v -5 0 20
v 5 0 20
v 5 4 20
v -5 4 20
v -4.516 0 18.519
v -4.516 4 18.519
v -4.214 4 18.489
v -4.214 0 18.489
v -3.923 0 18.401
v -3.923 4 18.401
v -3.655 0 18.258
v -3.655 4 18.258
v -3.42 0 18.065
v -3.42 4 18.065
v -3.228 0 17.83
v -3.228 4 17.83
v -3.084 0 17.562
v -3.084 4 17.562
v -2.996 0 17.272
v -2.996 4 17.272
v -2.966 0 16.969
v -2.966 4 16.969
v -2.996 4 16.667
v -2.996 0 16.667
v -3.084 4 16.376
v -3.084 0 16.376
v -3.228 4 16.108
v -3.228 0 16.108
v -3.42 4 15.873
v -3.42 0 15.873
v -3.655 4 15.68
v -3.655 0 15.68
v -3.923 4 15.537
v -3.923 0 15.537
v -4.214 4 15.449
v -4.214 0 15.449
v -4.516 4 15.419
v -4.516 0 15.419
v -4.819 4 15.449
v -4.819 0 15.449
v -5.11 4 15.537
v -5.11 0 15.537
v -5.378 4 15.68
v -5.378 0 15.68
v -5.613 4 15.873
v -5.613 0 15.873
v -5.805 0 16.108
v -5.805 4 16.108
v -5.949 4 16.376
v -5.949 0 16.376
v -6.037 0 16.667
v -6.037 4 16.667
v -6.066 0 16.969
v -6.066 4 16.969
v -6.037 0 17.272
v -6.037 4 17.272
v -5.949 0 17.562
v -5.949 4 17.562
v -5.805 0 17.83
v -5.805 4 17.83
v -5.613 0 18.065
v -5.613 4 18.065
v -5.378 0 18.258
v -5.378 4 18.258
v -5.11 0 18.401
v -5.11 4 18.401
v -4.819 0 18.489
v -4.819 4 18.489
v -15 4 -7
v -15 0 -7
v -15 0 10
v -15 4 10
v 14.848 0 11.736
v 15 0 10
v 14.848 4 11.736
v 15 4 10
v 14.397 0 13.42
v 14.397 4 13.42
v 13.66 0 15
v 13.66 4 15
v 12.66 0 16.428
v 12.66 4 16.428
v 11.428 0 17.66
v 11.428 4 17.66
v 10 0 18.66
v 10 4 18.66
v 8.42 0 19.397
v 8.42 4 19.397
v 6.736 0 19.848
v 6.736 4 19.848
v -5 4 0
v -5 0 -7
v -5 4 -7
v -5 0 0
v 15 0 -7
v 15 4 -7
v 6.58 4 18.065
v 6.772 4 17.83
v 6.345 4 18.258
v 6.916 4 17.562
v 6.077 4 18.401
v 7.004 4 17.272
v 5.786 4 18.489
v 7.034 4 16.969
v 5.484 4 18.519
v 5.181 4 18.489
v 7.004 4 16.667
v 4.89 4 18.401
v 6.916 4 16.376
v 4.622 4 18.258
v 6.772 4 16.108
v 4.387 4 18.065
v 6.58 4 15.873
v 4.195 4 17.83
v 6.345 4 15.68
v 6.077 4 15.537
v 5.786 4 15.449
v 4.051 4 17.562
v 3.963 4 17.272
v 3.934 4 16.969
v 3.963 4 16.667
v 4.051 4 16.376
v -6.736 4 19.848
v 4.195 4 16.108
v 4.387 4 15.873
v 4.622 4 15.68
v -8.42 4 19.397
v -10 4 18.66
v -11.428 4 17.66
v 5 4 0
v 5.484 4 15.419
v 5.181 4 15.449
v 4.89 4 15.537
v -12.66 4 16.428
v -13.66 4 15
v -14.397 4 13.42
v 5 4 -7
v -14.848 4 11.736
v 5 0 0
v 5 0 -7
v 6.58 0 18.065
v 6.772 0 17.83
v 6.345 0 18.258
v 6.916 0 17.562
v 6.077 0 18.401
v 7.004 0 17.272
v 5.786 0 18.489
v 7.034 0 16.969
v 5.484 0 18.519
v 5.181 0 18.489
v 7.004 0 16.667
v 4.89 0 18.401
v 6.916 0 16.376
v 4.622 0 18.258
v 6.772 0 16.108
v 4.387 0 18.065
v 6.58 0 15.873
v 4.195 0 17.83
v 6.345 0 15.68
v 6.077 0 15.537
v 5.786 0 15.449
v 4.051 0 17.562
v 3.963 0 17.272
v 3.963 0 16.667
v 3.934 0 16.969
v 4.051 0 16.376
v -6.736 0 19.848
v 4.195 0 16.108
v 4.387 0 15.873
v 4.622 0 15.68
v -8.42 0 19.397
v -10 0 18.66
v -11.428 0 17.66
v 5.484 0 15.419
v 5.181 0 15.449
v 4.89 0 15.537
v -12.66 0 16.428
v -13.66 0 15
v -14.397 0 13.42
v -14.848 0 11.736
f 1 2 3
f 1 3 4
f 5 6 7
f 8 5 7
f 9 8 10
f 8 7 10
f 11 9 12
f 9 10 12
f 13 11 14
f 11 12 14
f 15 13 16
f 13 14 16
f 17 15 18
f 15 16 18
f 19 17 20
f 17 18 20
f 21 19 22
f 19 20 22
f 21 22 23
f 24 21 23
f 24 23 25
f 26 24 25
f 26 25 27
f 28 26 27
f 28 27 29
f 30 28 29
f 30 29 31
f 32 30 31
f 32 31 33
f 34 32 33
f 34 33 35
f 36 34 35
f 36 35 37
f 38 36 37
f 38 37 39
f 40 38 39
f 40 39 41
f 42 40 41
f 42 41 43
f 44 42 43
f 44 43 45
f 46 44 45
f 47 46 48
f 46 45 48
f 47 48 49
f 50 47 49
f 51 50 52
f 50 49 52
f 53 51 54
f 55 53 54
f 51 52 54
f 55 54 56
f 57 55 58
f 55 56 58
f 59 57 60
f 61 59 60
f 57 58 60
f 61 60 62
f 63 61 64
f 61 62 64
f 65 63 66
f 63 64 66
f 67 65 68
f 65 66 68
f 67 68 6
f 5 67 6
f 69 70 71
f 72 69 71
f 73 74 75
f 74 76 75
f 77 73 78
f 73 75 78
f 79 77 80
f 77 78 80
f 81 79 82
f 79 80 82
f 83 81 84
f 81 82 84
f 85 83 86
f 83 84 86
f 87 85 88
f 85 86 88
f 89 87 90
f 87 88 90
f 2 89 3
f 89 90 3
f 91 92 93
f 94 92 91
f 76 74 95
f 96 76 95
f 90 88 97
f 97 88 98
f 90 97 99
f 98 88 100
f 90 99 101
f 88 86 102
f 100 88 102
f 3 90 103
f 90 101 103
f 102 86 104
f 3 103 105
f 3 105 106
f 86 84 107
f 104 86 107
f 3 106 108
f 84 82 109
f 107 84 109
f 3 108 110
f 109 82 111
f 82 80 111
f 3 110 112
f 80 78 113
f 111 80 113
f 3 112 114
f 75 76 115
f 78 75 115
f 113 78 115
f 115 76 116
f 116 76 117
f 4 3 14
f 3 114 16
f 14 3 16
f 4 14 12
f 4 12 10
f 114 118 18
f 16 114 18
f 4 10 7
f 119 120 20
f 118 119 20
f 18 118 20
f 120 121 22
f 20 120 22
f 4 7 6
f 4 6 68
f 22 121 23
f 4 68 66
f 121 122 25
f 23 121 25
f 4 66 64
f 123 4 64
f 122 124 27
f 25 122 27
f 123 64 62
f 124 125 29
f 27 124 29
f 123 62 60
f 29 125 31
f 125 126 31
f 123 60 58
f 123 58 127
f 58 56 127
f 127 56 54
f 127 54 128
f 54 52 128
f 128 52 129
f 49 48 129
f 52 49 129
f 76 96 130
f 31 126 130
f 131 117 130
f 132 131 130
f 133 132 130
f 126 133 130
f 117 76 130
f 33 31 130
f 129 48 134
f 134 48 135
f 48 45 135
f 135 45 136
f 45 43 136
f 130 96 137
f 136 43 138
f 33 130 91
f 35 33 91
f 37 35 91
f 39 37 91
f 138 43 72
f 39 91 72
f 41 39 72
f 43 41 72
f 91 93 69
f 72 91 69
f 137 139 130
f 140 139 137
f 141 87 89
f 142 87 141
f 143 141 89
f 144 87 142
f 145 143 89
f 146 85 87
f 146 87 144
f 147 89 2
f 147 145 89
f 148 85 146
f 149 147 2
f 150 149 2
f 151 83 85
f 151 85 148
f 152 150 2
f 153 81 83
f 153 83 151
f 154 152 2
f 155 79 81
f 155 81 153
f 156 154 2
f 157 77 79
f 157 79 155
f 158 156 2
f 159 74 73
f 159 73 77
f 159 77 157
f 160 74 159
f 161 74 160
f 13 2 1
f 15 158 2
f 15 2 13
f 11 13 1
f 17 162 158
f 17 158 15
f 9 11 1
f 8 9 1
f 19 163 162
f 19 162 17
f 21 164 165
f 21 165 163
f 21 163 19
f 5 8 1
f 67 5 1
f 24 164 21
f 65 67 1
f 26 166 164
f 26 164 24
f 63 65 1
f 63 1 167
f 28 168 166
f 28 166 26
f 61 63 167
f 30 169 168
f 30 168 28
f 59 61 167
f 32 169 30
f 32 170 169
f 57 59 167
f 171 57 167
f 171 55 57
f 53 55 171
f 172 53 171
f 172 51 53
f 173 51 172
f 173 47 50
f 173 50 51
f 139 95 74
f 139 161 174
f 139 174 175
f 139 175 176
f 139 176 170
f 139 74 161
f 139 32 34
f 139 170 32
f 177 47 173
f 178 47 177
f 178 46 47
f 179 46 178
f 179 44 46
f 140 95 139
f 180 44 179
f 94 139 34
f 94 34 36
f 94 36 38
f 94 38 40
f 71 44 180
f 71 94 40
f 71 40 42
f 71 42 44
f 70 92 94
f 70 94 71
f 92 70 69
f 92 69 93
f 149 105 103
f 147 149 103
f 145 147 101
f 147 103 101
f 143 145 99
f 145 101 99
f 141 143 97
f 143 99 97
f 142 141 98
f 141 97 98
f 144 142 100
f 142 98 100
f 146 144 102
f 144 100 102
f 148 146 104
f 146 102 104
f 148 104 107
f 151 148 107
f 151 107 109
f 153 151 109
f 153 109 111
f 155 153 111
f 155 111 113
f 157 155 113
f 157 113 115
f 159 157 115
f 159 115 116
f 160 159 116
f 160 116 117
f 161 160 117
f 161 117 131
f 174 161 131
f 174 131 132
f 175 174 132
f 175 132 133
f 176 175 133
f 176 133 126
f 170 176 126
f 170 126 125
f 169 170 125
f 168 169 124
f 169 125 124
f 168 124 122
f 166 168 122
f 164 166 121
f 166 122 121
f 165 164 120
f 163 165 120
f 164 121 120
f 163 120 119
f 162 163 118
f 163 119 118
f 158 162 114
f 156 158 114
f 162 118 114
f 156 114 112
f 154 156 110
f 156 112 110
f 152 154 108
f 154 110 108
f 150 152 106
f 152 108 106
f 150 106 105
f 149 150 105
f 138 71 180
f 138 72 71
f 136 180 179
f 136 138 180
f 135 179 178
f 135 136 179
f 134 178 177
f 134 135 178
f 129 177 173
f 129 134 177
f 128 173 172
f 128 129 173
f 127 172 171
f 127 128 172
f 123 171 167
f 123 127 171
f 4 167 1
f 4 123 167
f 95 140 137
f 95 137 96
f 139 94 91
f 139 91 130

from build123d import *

# Parameters (mm, degrees)
BOSS_EXTRU_1_DEPTH      = 4
CONG_1_R                = 10
ESQUISSE3_R             = 1.55
ENL_V_MAT_EXTRU_1_DEPTH = 10


with BuildPart() as part:
    # Esquisse2 → Boss.-Extru.1 (new body)
    with BuildSketch(Plane(origin=(0, 0, 0), x_dir=(1, 0, 0), z_dir=(0, 1, 0))):
        Polygon((-15, 4.125844984), (-15, 7), (-5, 7), (-5, 0), (5, 0), (5, 7), (15, 7), (15, 0.999487428), (15, -20), (-15, -20), align=None)
    extrude(amount=BOSS_EXTRU_1_DEPTH)

    # Congé1
    cong_1_edges = [part.edges().sort_by_distance(p)[0] for p in [
        (15, 2, 20),
        (-15, 2, 20),
    ]]
    fillet(cong_1_edges, radius=CONG_1_R)

    # Esquisse3 → Enlèv. mat.-Extru.1 (cut)
    with BuildSketch(Plane(origin=(0, 4, 0), x_dir=(1, 0, 0), z_dir=(0, 1, 0))):
        with Locations(Location((5.483505043, -16.969125841, 0), (0, 0, 270))):
            Circle(ESQUISSE3_R)
        with Locations(Location((-4.516494957, -16.969125841, 0), (0, 0, 270))):
            Circle(ESQUISSE3_R)
    extrude(amount=-ENL_V_MAT_EXTRU_1_DEPTH, mode=Mode.SUBTRACT)


solid = part.part
